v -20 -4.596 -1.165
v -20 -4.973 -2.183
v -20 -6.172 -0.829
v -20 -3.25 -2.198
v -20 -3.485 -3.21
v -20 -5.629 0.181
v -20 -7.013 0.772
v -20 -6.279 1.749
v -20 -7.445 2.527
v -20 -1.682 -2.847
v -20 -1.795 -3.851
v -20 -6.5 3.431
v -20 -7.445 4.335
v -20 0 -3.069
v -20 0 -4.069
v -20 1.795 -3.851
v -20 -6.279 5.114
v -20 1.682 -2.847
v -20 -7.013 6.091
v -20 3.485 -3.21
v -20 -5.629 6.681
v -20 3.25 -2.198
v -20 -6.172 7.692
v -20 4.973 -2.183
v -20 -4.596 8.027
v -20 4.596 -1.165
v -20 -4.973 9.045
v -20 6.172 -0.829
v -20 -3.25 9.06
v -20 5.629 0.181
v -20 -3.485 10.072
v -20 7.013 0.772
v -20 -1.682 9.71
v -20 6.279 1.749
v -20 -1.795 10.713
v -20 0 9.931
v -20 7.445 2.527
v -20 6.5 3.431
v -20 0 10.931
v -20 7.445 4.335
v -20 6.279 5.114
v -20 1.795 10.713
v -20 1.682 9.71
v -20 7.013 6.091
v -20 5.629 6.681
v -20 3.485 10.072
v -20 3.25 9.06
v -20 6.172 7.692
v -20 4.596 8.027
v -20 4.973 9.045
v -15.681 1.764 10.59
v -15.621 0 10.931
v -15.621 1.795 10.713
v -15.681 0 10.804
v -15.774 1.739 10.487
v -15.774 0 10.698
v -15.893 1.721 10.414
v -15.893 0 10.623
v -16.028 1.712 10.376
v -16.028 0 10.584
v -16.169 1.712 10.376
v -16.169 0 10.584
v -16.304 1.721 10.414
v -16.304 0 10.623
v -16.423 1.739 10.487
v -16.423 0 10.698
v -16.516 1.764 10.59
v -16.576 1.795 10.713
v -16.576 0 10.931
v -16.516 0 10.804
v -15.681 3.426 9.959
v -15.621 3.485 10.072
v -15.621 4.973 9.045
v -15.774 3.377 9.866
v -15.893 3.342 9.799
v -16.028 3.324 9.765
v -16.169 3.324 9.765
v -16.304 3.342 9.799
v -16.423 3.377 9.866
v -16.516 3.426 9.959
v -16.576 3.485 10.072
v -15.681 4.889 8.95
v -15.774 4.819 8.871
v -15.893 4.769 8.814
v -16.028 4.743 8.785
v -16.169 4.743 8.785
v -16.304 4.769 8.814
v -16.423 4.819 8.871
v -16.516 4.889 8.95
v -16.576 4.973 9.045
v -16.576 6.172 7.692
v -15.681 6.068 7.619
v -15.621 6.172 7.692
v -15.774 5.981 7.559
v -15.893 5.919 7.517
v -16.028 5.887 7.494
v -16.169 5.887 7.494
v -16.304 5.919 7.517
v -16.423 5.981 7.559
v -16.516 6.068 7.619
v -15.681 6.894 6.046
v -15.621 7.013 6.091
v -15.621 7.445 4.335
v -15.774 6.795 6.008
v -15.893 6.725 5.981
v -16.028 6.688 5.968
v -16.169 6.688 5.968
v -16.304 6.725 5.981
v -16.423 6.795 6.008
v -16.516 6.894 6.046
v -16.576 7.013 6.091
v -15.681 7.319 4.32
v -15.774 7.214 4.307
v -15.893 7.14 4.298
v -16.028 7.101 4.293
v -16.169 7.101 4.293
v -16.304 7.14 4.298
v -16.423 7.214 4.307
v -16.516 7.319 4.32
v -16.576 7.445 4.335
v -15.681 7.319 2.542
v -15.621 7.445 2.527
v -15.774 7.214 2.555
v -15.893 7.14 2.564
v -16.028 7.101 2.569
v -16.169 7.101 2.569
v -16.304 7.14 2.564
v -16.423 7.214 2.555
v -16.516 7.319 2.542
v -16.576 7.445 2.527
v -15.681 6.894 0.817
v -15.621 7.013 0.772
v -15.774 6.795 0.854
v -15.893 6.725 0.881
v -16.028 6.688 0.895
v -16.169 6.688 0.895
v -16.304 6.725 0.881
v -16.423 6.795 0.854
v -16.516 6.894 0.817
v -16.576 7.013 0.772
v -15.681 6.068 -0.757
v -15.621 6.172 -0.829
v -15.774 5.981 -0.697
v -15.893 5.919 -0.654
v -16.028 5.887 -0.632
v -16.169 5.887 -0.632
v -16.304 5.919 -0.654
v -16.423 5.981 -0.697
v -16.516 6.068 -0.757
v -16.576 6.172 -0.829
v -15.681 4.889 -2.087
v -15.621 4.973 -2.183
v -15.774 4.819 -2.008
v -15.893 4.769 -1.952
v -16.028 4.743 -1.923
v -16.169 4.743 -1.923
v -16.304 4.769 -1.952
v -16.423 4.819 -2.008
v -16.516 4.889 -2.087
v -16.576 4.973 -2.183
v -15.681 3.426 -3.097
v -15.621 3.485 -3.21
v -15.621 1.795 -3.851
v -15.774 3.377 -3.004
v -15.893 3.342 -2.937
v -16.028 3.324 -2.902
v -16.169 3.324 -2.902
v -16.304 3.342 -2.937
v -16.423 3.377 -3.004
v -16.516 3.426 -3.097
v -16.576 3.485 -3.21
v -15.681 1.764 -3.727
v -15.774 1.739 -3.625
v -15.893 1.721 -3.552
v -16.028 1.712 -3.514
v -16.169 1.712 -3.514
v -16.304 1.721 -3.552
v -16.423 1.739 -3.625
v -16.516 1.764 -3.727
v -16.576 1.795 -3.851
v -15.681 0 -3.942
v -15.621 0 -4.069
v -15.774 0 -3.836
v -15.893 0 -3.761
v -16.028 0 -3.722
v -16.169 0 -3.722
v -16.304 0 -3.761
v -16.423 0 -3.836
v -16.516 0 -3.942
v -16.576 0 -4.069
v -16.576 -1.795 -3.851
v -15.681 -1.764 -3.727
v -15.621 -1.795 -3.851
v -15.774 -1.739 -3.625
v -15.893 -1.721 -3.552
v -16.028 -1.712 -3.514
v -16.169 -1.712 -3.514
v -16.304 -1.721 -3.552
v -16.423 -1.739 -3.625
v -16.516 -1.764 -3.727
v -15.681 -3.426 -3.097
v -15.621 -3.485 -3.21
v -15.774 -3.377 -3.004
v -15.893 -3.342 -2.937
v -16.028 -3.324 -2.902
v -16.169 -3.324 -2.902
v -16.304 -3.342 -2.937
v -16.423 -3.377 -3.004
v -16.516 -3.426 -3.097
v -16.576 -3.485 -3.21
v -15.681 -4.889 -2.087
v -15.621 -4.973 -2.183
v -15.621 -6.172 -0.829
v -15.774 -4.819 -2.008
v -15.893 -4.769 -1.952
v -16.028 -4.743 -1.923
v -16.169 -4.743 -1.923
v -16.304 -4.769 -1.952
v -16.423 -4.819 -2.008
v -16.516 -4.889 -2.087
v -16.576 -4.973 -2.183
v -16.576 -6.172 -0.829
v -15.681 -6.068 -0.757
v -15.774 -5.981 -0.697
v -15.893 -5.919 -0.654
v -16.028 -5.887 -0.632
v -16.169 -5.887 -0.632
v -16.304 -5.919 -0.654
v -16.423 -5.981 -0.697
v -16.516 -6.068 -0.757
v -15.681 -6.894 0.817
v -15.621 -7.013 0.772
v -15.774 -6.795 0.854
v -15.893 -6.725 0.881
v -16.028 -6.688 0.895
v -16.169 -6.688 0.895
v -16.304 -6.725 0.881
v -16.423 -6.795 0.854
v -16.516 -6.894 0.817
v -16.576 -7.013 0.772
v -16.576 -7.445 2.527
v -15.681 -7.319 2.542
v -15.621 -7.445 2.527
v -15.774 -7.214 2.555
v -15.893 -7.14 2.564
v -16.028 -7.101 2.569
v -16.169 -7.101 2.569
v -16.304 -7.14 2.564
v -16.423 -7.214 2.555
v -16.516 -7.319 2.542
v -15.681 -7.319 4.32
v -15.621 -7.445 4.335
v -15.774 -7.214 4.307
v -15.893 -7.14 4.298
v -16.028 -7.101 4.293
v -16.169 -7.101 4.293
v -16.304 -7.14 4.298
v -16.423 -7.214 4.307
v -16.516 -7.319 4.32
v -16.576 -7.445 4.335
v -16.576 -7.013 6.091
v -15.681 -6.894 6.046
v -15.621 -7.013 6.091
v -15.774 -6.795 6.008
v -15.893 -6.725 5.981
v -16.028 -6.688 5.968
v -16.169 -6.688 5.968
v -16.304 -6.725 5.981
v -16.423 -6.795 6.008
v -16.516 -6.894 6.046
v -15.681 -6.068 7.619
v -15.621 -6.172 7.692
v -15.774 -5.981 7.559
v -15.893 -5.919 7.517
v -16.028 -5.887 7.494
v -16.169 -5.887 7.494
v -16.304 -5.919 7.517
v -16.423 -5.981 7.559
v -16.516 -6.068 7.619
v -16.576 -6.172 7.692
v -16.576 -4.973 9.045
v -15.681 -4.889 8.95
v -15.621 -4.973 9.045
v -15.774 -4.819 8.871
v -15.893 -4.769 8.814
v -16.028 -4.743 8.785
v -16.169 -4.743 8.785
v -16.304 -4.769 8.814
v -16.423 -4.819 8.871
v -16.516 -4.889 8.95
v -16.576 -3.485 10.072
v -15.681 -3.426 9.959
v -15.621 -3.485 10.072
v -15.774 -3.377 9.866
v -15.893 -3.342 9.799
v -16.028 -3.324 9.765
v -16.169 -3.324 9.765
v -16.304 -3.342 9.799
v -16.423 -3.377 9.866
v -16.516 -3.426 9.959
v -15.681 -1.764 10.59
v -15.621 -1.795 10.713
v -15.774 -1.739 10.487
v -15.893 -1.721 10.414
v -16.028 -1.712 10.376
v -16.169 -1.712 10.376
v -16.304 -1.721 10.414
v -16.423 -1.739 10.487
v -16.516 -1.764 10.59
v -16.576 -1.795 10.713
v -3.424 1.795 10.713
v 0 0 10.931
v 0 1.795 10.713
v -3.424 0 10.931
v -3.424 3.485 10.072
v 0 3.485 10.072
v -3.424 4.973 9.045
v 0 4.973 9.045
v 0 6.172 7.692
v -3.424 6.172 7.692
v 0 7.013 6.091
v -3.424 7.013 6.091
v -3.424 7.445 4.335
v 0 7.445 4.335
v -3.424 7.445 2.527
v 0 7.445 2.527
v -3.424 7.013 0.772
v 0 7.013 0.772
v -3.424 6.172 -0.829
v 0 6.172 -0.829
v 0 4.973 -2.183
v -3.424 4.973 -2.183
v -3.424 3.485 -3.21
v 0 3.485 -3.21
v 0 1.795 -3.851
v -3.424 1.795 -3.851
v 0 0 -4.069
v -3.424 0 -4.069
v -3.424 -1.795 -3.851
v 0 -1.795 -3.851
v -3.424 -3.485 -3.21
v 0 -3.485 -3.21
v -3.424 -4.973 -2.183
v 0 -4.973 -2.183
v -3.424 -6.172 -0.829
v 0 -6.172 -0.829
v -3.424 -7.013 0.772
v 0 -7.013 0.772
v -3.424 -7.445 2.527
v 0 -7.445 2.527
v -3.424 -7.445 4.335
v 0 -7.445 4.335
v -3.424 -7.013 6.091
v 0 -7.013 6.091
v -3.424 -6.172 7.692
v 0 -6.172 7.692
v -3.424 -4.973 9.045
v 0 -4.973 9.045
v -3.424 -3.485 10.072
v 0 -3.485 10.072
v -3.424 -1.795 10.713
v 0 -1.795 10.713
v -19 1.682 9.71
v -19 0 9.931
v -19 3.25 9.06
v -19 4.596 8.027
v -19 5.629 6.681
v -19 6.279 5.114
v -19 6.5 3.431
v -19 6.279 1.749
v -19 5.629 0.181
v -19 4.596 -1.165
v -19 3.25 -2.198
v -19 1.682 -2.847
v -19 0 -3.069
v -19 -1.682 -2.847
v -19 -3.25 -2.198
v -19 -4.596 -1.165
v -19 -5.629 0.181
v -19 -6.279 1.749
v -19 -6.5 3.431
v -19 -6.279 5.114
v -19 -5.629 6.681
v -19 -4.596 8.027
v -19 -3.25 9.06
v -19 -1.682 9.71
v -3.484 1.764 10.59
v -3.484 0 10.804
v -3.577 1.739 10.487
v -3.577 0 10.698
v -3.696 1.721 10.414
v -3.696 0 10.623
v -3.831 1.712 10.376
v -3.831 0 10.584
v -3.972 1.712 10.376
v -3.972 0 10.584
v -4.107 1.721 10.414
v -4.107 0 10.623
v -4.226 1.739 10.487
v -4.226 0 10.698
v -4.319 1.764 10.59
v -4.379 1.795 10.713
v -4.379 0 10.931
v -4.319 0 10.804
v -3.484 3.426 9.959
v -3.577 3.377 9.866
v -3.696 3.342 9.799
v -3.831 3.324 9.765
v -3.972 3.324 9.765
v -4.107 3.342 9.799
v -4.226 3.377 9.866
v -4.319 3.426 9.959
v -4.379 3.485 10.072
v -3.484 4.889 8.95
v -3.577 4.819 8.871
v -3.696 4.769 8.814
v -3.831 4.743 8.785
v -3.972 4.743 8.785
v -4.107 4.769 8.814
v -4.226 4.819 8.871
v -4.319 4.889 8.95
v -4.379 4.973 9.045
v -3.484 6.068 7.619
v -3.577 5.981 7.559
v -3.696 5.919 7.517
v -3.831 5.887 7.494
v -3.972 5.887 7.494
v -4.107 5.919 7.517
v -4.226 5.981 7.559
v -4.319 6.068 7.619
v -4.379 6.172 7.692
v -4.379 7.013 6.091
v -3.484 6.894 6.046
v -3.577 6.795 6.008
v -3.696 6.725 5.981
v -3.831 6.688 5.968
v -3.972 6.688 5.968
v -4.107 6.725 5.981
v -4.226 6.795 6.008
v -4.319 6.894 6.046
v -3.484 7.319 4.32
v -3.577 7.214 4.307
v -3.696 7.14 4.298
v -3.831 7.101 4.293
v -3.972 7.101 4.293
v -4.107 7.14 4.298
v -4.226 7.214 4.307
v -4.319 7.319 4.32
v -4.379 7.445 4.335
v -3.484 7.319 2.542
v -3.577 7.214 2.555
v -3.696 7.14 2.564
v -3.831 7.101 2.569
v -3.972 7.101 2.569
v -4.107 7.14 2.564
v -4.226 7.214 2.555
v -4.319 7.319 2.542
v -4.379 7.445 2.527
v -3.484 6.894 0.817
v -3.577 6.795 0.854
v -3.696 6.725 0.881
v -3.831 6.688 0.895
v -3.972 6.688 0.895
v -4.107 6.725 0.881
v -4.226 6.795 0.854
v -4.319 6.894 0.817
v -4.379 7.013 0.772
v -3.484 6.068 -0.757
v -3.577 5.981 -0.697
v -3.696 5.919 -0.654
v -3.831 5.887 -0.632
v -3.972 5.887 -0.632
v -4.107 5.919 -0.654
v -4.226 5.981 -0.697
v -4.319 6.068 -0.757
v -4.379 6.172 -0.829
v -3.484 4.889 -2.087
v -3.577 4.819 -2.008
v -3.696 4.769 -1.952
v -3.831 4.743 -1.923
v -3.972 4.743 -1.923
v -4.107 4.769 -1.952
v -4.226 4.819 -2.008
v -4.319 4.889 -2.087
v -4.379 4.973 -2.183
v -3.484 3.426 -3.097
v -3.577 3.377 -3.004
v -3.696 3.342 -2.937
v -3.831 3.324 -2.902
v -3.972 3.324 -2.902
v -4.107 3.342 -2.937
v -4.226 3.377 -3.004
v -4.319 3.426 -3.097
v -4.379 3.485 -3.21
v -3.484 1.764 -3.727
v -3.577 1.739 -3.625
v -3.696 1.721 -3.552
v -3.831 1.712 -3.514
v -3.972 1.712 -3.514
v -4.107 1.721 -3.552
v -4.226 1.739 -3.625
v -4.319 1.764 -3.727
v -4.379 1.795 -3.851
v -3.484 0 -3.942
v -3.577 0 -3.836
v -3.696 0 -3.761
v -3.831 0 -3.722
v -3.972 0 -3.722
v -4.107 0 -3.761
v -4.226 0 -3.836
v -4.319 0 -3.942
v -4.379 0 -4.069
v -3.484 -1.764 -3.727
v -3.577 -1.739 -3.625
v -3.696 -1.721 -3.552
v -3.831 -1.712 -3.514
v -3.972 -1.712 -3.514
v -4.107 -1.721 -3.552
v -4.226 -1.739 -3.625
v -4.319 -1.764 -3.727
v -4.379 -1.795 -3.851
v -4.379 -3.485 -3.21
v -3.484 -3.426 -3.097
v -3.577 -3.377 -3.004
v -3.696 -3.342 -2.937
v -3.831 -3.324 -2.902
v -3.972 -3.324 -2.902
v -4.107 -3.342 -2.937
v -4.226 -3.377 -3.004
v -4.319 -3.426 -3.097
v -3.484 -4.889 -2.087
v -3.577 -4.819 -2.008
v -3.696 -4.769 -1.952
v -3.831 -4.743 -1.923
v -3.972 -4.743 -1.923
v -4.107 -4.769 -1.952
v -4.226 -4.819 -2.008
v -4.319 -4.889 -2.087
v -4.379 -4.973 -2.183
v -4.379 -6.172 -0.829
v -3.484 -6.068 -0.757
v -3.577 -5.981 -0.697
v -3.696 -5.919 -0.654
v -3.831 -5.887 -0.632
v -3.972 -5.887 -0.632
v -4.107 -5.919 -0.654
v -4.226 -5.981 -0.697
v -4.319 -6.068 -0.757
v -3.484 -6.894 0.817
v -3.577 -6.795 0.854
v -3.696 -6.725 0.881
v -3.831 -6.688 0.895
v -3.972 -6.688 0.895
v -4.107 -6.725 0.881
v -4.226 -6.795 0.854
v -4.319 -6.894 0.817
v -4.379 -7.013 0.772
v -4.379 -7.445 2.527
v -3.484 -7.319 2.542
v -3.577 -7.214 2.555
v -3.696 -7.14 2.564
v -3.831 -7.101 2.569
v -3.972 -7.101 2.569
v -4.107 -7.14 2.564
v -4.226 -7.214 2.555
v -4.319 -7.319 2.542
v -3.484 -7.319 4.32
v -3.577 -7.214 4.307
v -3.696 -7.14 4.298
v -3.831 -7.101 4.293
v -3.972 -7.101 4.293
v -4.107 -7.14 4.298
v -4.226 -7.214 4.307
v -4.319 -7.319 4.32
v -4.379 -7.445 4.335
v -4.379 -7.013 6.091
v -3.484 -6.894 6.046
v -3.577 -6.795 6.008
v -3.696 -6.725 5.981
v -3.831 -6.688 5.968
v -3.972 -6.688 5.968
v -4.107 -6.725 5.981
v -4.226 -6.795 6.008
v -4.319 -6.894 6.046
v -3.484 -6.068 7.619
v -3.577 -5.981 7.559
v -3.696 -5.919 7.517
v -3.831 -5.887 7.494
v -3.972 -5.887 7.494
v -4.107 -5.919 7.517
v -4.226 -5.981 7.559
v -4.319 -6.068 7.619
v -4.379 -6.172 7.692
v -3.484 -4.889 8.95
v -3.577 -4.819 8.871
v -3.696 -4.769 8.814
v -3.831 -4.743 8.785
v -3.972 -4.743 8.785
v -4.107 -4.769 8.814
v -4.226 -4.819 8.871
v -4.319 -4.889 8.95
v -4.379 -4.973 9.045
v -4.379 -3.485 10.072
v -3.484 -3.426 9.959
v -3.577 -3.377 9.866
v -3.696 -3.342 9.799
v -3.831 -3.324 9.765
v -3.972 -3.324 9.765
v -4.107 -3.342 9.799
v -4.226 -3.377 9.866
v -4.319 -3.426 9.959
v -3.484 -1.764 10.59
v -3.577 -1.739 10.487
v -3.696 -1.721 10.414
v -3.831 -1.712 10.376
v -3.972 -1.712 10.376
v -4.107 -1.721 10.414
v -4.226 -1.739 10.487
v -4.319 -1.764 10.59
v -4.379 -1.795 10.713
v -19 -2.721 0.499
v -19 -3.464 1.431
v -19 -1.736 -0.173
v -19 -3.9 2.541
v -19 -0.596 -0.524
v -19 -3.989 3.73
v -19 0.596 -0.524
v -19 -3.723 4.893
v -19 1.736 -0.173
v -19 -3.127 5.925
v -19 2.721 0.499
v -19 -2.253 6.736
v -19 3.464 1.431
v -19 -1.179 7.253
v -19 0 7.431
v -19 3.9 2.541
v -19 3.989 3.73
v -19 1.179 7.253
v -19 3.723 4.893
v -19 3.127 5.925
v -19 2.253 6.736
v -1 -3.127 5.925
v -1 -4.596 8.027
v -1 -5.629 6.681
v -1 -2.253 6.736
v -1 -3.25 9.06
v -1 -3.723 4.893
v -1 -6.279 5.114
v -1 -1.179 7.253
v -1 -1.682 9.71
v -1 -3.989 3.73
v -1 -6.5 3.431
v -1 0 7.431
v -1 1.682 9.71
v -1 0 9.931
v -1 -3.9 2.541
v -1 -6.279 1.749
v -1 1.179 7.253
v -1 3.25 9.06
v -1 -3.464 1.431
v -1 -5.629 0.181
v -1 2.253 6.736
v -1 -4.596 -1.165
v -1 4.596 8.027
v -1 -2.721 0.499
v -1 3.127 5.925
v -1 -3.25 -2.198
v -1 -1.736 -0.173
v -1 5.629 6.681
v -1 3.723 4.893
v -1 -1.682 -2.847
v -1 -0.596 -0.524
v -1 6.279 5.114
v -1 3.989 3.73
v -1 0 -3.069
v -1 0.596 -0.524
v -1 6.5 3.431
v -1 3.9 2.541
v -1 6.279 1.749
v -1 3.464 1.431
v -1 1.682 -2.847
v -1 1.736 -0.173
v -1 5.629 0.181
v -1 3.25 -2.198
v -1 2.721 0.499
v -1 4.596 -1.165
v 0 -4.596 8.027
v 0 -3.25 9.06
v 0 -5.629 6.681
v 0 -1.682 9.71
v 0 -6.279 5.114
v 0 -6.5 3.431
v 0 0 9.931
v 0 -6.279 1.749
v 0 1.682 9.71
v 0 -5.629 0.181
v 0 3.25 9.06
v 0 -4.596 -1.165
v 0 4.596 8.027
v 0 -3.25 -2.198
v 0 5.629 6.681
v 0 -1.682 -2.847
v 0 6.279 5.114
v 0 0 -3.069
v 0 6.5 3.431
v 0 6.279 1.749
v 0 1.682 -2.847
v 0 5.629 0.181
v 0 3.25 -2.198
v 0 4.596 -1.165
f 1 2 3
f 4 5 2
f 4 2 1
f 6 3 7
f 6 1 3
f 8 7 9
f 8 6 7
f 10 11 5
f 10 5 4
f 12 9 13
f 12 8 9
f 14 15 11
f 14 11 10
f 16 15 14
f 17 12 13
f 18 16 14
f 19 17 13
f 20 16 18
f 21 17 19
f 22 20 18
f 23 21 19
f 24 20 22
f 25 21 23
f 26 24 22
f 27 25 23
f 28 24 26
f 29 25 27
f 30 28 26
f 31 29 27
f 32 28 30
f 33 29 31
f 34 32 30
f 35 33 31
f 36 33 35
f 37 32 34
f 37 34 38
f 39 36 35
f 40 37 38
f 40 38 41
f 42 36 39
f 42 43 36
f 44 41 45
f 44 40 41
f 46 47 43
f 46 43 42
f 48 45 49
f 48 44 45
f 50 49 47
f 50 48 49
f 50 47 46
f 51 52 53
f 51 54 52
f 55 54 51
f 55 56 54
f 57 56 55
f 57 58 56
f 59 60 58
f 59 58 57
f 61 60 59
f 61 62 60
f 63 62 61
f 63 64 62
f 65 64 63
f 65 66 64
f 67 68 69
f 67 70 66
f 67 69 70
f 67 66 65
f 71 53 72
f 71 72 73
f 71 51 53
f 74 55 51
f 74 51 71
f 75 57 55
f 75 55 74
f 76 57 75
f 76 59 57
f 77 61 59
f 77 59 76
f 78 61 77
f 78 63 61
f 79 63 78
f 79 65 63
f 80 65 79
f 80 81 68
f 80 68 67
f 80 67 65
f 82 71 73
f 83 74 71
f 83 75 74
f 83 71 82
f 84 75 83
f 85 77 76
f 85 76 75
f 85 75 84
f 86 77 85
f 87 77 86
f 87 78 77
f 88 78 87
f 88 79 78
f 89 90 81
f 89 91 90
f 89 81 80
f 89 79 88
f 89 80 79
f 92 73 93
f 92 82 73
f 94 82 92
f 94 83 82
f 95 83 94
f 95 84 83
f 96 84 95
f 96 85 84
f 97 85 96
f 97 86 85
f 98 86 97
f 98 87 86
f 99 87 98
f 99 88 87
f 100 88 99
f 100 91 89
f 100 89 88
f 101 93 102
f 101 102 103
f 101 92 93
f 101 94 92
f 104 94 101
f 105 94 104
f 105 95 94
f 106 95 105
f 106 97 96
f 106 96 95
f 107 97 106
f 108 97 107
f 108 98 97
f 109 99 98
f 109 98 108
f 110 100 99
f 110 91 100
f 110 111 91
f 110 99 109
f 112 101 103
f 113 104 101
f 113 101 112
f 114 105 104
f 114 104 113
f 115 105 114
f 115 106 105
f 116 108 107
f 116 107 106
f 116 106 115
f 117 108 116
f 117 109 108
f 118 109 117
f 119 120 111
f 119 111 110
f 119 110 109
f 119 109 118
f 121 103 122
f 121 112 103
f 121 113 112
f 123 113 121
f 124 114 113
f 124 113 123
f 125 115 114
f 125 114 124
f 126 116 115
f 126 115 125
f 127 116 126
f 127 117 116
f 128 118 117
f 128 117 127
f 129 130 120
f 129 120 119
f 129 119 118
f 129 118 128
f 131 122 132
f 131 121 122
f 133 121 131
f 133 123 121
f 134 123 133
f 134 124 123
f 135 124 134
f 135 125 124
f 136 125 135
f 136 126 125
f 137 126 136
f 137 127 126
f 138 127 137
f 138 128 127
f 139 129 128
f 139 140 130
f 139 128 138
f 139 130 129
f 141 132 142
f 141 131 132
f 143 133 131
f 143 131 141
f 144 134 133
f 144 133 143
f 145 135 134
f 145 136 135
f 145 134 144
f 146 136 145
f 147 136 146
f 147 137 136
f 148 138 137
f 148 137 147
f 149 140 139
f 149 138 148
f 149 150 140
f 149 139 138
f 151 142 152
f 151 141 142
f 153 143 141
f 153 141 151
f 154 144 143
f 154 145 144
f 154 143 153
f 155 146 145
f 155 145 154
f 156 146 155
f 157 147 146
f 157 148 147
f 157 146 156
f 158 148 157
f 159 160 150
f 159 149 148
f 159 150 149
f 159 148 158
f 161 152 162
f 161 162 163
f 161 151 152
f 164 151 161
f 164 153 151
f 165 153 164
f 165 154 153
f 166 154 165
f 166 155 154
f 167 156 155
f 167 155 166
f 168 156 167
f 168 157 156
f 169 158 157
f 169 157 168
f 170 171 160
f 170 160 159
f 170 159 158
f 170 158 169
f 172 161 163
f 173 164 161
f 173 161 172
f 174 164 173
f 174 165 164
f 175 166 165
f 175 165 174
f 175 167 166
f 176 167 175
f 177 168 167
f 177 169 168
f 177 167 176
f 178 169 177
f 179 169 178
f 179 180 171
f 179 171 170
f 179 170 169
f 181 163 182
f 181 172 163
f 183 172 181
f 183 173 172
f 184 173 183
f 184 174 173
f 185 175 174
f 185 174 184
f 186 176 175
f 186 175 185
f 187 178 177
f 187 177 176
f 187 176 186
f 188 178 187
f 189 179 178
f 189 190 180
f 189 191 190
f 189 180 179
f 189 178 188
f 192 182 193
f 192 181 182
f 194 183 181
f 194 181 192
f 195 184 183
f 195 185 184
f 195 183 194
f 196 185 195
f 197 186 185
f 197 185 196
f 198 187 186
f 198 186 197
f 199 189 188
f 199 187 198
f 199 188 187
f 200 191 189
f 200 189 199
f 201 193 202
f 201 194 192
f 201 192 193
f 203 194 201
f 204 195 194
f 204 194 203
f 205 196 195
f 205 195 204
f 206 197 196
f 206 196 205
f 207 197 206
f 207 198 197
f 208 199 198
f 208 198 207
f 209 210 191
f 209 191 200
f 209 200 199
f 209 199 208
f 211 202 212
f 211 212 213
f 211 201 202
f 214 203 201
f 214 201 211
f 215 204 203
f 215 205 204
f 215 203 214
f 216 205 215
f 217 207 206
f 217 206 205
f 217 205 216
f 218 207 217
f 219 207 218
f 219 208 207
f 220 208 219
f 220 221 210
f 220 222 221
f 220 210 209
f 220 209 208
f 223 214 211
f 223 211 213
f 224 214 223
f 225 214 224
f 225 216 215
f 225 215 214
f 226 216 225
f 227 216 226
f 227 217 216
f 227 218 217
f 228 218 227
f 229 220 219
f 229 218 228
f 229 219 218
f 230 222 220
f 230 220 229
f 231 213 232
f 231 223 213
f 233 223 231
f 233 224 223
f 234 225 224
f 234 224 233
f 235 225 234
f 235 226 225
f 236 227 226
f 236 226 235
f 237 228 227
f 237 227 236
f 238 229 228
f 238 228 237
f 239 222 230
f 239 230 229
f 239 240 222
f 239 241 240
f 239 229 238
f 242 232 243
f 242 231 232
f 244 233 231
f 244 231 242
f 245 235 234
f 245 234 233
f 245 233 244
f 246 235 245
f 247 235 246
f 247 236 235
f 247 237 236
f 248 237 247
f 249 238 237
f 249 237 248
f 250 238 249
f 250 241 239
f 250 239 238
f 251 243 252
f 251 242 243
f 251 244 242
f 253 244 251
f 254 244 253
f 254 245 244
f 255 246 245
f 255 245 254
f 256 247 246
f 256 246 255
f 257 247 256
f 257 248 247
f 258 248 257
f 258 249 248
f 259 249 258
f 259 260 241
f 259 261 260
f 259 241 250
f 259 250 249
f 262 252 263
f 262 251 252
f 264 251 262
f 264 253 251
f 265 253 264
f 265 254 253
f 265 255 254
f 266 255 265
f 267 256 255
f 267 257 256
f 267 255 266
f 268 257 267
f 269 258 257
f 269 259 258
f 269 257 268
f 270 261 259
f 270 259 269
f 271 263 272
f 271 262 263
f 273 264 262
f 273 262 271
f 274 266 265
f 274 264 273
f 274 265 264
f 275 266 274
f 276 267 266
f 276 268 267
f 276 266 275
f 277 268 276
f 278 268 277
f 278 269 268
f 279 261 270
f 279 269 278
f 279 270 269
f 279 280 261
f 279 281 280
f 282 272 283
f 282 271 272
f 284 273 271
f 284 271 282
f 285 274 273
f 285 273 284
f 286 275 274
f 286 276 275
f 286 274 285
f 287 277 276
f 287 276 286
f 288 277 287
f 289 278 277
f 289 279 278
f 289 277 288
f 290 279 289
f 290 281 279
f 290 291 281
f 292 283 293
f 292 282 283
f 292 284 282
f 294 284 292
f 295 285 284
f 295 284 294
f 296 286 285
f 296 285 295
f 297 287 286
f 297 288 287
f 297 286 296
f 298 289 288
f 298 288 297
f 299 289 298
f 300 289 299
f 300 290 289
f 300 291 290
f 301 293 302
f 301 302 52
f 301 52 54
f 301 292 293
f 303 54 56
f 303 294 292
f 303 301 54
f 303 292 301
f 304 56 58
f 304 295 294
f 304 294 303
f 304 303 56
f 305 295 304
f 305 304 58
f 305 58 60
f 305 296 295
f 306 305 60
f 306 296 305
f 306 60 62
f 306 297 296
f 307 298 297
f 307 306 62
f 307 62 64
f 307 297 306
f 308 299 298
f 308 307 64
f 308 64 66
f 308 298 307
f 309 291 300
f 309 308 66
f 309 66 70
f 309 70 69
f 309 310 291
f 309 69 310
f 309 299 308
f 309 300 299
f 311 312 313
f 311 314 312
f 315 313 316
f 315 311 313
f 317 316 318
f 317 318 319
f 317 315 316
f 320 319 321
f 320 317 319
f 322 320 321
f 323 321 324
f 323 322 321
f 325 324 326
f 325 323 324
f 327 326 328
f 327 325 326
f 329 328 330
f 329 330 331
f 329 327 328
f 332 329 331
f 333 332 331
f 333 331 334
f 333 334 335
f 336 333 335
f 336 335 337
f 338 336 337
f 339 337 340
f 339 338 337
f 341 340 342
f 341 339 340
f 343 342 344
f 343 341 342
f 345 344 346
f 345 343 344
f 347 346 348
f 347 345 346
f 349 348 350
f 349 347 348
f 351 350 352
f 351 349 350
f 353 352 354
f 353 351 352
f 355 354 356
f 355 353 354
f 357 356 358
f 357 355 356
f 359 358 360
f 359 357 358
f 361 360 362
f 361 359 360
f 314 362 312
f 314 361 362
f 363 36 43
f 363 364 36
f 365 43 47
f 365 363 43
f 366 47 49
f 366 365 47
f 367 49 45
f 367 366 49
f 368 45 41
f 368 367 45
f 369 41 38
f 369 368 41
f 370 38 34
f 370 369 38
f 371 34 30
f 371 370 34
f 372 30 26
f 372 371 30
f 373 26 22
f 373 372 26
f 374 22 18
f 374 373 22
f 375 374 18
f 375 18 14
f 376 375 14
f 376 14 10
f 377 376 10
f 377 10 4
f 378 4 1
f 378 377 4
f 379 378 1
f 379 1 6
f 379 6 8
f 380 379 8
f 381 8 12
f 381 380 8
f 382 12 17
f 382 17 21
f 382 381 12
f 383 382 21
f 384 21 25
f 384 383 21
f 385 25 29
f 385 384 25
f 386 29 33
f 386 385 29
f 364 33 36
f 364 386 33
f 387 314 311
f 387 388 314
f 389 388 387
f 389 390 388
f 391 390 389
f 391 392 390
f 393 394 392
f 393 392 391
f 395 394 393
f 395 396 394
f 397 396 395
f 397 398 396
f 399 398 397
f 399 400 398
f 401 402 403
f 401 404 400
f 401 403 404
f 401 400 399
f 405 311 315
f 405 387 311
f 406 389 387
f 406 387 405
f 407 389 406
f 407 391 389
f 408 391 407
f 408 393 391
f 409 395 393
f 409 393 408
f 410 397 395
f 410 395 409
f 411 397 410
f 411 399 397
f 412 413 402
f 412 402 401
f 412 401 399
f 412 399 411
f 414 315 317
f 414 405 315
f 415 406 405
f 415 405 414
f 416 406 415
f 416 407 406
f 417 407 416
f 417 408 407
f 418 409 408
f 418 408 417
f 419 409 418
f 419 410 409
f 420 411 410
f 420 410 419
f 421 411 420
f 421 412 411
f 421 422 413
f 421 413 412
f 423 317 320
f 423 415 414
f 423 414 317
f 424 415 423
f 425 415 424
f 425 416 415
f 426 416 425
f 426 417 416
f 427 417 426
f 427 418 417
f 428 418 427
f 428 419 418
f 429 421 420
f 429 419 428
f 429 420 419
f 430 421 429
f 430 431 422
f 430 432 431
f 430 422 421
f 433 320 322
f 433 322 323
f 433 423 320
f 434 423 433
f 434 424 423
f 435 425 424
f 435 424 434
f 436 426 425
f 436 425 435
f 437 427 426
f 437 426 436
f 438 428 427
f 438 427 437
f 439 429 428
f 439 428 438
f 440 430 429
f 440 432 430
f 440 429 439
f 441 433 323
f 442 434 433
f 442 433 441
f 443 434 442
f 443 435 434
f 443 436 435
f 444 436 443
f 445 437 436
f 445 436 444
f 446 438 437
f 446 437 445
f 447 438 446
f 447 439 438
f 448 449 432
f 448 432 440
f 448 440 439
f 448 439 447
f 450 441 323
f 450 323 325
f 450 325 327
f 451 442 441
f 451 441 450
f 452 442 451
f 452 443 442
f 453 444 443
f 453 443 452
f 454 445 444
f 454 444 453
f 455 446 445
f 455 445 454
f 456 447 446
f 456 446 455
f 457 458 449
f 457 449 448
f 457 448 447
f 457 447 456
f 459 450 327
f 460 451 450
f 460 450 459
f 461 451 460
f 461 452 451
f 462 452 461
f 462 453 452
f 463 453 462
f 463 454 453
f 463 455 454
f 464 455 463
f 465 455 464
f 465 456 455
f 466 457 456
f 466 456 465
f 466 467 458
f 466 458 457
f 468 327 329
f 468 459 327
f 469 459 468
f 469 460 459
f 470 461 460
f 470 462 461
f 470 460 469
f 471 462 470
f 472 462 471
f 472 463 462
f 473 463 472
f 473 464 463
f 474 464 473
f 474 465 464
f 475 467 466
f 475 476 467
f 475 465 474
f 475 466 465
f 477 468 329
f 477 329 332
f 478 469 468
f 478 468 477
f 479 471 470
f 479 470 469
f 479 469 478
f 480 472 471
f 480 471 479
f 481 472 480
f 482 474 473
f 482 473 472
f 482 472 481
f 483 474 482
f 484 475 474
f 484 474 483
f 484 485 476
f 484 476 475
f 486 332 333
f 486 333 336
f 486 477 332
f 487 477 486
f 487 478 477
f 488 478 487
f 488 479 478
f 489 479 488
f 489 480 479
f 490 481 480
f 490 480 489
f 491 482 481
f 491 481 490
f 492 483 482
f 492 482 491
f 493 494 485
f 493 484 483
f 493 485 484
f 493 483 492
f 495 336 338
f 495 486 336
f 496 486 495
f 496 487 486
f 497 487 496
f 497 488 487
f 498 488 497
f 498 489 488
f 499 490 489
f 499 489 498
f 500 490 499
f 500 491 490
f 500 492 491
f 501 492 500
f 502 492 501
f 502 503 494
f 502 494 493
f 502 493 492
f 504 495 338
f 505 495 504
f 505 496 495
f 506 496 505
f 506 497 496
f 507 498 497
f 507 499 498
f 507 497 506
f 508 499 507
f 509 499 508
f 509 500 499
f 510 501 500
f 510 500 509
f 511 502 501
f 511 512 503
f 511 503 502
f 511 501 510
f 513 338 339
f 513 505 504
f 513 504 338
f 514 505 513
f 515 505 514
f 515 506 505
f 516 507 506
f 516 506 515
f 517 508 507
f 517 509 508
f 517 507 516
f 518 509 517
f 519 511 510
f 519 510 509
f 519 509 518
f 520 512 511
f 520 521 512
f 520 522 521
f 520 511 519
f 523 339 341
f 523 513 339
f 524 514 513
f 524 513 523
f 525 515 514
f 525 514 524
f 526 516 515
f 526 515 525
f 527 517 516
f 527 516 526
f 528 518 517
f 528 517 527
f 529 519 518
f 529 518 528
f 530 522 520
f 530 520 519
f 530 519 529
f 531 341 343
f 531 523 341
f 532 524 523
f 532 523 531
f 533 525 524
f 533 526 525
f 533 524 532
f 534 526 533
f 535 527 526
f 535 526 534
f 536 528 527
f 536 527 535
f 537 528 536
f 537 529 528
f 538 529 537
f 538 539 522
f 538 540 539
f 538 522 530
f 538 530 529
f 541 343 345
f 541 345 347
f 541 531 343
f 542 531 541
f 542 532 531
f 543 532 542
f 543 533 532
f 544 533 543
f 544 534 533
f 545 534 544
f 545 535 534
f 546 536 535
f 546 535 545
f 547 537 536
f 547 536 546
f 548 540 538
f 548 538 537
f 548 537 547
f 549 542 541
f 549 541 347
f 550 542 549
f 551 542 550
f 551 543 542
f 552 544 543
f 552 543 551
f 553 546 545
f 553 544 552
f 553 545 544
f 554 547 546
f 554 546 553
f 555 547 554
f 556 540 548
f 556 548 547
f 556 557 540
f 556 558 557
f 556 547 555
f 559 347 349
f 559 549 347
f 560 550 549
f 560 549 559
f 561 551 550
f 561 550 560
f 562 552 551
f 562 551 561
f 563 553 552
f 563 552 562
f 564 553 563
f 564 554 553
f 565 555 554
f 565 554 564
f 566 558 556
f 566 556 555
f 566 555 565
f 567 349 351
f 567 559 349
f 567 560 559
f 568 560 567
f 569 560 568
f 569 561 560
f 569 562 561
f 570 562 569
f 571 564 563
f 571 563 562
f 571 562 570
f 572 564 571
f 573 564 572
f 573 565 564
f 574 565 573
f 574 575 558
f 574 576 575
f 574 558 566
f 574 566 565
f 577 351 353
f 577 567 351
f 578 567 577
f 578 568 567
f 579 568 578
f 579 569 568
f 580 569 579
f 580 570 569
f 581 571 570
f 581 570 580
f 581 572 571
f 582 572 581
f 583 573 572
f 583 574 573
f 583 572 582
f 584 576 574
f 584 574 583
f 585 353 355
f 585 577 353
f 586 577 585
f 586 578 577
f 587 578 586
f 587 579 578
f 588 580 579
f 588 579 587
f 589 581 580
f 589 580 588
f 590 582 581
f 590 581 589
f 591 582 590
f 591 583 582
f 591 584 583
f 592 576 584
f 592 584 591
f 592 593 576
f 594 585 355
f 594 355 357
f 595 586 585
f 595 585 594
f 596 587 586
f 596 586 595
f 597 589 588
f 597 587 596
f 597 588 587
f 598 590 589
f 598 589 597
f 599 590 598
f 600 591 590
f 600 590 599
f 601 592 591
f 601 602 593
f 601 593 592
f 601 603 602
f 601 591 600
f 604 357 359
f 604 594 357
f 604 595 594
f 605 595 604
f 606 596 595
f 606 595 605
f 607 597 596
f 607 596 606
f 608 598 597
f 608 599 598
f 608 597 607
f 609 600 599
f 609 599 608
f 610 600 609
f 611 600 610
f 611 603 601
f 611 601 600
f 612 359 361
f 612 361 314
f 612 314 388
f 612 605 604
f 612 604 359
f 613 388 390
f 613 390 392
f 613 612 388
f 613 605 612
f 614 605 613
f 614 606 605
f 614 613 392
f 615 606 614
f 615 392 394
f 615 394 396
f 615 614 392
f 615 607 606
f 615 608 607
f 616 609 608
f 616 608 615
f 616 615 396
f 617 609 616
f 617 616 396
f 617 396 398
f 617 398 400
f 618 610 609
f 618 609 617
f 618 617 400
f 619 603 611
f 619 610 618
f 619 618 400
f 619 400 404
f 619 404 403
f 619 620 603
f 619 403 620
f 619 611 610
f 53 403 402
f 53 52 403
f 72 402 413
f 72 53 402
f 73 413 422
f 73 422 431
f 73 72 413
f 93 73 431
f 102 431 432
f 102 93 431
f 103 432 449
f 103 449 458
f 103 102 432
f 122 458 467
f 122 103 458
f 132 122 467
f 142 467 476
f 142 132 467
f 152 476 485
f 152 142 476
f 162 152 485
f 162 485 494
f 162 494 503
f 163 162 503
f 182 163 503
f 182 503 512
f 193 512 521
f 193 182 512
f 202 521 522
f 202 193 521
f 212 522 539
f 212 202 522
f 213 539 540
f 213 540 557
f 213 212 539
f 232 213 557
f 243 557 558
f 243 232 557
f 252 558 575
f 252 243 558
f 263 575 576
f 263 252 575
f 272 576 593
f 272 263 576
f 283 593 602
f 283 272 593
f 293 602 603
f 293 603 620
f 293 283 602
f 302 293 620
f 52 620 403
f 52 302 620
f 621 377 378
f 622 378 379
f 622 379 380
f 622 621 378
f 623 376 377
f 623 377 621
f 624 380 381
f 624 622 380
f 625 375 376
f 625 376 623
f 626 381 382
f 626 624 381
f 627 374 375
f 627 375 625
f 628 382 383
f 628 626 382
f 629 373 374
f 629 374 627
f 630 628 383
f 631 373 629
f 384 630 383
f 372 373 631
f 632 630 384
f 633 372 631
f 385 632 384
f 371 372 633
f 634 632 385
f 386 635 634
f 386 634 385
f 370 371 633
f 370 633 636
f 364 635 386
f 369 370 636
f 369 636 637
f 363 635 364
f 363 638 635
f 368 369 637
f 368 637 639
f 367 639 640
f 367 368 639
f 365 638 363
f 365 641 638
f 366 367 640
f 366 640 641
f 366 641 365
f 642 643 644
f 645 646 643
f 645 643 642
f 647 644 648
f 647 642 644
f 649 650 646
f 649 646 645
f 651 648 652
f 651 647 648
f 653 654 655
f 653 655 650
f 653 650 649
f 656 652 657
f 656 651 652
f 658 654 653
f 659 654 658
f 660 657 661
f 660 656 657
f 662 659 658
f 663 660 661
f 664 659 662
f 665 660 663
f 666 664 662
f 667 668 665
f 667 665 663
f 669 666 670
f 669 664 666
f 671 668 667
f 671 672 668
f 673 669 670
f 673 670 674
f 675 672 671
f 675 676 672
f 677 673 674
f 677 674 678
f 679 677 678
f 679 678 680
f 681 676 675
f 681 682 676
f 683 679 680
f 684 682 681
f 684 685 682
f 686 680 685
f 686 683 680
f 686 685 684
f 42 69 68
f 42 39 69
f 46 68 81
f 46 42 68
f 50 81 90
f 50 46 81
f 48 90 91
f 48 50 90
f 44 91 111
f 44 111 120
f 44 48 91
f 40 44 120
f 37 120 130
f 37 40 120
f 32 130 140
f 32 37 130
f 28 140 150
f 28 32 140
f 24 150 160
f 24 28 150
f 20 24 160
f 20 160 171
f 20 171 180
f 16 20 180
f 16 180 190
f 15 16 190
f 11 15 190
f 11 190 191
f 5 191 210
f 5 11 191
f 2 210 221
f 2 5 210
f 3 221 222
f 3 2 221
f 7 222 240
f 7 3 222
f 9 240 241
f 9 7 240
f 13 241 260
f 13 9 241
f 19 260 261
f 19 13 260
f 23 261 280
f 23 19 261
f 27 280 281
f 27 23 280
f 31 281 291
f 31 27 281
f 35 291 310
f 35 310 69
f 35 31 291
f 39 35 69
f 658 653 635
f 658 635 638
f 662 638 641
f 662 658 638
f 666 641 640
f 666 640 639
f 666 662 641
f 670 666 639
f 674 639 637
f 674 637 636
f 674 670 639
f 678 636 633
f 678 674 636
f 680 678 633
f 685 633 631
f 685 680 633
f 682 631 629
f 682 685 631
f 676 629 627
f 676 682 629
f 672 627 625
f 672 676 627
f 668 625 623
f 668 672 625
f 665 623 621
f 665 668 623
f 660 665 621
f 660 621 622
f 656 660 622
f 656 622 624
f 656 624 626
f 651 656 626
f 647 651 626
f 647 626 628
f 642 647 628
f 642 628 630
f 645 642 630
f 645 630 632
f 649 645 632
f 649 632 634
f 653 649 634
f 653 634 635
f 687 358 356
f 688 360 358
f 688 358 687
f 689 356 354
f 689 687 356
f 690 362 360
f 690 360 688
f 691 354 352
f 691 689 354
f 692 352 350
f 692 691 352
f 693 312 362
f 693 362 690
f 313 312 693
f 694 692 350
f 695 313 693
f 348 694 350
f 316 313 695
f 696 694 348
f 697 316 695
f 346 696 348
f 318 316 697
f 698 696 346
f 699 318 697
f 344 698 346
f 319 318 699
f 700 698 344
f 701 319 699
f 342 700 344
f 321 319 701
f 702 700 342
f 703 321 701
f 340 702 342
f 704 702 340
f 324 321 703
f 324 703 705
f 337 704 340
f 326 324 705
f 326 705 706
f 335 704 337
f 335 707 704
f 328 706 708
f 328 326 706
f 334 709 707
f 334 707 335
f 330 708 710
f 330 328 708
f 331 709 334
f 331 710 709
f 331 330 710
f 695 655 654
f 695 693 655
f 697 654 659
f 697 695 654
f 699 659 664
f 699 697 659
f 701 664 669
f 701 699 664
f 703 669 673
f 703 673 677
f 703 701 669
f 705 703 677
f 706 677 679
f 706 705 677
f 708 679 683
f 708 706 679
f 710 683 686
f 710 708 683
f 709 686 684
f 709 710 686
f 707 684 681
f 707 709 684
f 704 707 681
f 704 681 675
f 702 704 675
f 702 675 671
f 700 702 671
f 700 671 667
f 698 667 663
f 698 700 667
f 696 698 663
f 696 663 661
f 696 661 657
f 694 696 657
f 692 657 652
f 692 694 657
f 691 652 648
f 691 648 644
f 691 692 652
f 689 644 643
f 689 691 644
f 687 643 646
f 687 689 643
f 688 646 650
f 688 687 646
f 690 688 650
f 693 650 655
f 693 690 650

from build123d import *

# Parameters (mm, degrees)
F2_DEPTH = 25


# Not quite as in the source:
# - a feature names something its author has since deleted; it is built from what else it names


with BuildPart() as f1:
    # F0 (on Front) → F1 (revolve)
    with BuildSketch(Plane.XZ):
        with BuildLine():
            Line((0, 9.9311807901), (0, 10.9311807901))
            Line((0, 10.9311807901), (-3.4236455734, 10.9311807901))
            ThreePointArc((-3.4236455734, 10.9311807901), (-3.9013040029, 10.5789726191), (-4.3789624324, 10.9311807901))
            Line((-4.3789624324, 10.9311807901), (-15.6210375676, 10.9311807901))
            ThreePointArc((-15.6210375676, 10.9311807901), (-16.0986959971, 10.5789726191), (-16.5763544266, 10.9311807901))
            Line((-16.5763544266, 10.9311807901), (-20, 10.9311807901))
            Line((-20, 10.9311807901), (-20, 9.9311807901))
            Line((-20, 9.9311807901), (-19, 9.9311807901))
            Line((-19, 9.9311807901), (-19, 7.4311807901))
            Line((-19, 7.4311807901), (-18.118519783, 7.4311807901))
            Line((-18.118519783, 7.4311807901), (-18.118519783, 3.4311807901))
            Line((-18.118519783, 3.4311807901), (-1.881480217, 3.4311807901))
            Line((-1.881480217, 3.4311807901), (-1.881480217, 7.4311807901))
            Line((-1.881480217, 7.4311807901), (-1, 7.4311807901))
            Line((-1, 7.4311807901), (-1, 9.9311807901))
            Line((-1, 9.9311807901), (0, 9.9311807901))
        make_face()
    revolve(axis=Axis((-10, 0, 3.4311807901), (-1, 0, 0)))

    # F2 (cut): a face of the model
    f2_faces = [f1.faces().sort_by_distance(p)[0] for p in [
        (-18.118519783, 0, 3.4311807901),
    ]]
    extrude(f2_faces, amount=-F2_DEPTH, mode=Mode.SUBTRACT)


solid = f1.part
